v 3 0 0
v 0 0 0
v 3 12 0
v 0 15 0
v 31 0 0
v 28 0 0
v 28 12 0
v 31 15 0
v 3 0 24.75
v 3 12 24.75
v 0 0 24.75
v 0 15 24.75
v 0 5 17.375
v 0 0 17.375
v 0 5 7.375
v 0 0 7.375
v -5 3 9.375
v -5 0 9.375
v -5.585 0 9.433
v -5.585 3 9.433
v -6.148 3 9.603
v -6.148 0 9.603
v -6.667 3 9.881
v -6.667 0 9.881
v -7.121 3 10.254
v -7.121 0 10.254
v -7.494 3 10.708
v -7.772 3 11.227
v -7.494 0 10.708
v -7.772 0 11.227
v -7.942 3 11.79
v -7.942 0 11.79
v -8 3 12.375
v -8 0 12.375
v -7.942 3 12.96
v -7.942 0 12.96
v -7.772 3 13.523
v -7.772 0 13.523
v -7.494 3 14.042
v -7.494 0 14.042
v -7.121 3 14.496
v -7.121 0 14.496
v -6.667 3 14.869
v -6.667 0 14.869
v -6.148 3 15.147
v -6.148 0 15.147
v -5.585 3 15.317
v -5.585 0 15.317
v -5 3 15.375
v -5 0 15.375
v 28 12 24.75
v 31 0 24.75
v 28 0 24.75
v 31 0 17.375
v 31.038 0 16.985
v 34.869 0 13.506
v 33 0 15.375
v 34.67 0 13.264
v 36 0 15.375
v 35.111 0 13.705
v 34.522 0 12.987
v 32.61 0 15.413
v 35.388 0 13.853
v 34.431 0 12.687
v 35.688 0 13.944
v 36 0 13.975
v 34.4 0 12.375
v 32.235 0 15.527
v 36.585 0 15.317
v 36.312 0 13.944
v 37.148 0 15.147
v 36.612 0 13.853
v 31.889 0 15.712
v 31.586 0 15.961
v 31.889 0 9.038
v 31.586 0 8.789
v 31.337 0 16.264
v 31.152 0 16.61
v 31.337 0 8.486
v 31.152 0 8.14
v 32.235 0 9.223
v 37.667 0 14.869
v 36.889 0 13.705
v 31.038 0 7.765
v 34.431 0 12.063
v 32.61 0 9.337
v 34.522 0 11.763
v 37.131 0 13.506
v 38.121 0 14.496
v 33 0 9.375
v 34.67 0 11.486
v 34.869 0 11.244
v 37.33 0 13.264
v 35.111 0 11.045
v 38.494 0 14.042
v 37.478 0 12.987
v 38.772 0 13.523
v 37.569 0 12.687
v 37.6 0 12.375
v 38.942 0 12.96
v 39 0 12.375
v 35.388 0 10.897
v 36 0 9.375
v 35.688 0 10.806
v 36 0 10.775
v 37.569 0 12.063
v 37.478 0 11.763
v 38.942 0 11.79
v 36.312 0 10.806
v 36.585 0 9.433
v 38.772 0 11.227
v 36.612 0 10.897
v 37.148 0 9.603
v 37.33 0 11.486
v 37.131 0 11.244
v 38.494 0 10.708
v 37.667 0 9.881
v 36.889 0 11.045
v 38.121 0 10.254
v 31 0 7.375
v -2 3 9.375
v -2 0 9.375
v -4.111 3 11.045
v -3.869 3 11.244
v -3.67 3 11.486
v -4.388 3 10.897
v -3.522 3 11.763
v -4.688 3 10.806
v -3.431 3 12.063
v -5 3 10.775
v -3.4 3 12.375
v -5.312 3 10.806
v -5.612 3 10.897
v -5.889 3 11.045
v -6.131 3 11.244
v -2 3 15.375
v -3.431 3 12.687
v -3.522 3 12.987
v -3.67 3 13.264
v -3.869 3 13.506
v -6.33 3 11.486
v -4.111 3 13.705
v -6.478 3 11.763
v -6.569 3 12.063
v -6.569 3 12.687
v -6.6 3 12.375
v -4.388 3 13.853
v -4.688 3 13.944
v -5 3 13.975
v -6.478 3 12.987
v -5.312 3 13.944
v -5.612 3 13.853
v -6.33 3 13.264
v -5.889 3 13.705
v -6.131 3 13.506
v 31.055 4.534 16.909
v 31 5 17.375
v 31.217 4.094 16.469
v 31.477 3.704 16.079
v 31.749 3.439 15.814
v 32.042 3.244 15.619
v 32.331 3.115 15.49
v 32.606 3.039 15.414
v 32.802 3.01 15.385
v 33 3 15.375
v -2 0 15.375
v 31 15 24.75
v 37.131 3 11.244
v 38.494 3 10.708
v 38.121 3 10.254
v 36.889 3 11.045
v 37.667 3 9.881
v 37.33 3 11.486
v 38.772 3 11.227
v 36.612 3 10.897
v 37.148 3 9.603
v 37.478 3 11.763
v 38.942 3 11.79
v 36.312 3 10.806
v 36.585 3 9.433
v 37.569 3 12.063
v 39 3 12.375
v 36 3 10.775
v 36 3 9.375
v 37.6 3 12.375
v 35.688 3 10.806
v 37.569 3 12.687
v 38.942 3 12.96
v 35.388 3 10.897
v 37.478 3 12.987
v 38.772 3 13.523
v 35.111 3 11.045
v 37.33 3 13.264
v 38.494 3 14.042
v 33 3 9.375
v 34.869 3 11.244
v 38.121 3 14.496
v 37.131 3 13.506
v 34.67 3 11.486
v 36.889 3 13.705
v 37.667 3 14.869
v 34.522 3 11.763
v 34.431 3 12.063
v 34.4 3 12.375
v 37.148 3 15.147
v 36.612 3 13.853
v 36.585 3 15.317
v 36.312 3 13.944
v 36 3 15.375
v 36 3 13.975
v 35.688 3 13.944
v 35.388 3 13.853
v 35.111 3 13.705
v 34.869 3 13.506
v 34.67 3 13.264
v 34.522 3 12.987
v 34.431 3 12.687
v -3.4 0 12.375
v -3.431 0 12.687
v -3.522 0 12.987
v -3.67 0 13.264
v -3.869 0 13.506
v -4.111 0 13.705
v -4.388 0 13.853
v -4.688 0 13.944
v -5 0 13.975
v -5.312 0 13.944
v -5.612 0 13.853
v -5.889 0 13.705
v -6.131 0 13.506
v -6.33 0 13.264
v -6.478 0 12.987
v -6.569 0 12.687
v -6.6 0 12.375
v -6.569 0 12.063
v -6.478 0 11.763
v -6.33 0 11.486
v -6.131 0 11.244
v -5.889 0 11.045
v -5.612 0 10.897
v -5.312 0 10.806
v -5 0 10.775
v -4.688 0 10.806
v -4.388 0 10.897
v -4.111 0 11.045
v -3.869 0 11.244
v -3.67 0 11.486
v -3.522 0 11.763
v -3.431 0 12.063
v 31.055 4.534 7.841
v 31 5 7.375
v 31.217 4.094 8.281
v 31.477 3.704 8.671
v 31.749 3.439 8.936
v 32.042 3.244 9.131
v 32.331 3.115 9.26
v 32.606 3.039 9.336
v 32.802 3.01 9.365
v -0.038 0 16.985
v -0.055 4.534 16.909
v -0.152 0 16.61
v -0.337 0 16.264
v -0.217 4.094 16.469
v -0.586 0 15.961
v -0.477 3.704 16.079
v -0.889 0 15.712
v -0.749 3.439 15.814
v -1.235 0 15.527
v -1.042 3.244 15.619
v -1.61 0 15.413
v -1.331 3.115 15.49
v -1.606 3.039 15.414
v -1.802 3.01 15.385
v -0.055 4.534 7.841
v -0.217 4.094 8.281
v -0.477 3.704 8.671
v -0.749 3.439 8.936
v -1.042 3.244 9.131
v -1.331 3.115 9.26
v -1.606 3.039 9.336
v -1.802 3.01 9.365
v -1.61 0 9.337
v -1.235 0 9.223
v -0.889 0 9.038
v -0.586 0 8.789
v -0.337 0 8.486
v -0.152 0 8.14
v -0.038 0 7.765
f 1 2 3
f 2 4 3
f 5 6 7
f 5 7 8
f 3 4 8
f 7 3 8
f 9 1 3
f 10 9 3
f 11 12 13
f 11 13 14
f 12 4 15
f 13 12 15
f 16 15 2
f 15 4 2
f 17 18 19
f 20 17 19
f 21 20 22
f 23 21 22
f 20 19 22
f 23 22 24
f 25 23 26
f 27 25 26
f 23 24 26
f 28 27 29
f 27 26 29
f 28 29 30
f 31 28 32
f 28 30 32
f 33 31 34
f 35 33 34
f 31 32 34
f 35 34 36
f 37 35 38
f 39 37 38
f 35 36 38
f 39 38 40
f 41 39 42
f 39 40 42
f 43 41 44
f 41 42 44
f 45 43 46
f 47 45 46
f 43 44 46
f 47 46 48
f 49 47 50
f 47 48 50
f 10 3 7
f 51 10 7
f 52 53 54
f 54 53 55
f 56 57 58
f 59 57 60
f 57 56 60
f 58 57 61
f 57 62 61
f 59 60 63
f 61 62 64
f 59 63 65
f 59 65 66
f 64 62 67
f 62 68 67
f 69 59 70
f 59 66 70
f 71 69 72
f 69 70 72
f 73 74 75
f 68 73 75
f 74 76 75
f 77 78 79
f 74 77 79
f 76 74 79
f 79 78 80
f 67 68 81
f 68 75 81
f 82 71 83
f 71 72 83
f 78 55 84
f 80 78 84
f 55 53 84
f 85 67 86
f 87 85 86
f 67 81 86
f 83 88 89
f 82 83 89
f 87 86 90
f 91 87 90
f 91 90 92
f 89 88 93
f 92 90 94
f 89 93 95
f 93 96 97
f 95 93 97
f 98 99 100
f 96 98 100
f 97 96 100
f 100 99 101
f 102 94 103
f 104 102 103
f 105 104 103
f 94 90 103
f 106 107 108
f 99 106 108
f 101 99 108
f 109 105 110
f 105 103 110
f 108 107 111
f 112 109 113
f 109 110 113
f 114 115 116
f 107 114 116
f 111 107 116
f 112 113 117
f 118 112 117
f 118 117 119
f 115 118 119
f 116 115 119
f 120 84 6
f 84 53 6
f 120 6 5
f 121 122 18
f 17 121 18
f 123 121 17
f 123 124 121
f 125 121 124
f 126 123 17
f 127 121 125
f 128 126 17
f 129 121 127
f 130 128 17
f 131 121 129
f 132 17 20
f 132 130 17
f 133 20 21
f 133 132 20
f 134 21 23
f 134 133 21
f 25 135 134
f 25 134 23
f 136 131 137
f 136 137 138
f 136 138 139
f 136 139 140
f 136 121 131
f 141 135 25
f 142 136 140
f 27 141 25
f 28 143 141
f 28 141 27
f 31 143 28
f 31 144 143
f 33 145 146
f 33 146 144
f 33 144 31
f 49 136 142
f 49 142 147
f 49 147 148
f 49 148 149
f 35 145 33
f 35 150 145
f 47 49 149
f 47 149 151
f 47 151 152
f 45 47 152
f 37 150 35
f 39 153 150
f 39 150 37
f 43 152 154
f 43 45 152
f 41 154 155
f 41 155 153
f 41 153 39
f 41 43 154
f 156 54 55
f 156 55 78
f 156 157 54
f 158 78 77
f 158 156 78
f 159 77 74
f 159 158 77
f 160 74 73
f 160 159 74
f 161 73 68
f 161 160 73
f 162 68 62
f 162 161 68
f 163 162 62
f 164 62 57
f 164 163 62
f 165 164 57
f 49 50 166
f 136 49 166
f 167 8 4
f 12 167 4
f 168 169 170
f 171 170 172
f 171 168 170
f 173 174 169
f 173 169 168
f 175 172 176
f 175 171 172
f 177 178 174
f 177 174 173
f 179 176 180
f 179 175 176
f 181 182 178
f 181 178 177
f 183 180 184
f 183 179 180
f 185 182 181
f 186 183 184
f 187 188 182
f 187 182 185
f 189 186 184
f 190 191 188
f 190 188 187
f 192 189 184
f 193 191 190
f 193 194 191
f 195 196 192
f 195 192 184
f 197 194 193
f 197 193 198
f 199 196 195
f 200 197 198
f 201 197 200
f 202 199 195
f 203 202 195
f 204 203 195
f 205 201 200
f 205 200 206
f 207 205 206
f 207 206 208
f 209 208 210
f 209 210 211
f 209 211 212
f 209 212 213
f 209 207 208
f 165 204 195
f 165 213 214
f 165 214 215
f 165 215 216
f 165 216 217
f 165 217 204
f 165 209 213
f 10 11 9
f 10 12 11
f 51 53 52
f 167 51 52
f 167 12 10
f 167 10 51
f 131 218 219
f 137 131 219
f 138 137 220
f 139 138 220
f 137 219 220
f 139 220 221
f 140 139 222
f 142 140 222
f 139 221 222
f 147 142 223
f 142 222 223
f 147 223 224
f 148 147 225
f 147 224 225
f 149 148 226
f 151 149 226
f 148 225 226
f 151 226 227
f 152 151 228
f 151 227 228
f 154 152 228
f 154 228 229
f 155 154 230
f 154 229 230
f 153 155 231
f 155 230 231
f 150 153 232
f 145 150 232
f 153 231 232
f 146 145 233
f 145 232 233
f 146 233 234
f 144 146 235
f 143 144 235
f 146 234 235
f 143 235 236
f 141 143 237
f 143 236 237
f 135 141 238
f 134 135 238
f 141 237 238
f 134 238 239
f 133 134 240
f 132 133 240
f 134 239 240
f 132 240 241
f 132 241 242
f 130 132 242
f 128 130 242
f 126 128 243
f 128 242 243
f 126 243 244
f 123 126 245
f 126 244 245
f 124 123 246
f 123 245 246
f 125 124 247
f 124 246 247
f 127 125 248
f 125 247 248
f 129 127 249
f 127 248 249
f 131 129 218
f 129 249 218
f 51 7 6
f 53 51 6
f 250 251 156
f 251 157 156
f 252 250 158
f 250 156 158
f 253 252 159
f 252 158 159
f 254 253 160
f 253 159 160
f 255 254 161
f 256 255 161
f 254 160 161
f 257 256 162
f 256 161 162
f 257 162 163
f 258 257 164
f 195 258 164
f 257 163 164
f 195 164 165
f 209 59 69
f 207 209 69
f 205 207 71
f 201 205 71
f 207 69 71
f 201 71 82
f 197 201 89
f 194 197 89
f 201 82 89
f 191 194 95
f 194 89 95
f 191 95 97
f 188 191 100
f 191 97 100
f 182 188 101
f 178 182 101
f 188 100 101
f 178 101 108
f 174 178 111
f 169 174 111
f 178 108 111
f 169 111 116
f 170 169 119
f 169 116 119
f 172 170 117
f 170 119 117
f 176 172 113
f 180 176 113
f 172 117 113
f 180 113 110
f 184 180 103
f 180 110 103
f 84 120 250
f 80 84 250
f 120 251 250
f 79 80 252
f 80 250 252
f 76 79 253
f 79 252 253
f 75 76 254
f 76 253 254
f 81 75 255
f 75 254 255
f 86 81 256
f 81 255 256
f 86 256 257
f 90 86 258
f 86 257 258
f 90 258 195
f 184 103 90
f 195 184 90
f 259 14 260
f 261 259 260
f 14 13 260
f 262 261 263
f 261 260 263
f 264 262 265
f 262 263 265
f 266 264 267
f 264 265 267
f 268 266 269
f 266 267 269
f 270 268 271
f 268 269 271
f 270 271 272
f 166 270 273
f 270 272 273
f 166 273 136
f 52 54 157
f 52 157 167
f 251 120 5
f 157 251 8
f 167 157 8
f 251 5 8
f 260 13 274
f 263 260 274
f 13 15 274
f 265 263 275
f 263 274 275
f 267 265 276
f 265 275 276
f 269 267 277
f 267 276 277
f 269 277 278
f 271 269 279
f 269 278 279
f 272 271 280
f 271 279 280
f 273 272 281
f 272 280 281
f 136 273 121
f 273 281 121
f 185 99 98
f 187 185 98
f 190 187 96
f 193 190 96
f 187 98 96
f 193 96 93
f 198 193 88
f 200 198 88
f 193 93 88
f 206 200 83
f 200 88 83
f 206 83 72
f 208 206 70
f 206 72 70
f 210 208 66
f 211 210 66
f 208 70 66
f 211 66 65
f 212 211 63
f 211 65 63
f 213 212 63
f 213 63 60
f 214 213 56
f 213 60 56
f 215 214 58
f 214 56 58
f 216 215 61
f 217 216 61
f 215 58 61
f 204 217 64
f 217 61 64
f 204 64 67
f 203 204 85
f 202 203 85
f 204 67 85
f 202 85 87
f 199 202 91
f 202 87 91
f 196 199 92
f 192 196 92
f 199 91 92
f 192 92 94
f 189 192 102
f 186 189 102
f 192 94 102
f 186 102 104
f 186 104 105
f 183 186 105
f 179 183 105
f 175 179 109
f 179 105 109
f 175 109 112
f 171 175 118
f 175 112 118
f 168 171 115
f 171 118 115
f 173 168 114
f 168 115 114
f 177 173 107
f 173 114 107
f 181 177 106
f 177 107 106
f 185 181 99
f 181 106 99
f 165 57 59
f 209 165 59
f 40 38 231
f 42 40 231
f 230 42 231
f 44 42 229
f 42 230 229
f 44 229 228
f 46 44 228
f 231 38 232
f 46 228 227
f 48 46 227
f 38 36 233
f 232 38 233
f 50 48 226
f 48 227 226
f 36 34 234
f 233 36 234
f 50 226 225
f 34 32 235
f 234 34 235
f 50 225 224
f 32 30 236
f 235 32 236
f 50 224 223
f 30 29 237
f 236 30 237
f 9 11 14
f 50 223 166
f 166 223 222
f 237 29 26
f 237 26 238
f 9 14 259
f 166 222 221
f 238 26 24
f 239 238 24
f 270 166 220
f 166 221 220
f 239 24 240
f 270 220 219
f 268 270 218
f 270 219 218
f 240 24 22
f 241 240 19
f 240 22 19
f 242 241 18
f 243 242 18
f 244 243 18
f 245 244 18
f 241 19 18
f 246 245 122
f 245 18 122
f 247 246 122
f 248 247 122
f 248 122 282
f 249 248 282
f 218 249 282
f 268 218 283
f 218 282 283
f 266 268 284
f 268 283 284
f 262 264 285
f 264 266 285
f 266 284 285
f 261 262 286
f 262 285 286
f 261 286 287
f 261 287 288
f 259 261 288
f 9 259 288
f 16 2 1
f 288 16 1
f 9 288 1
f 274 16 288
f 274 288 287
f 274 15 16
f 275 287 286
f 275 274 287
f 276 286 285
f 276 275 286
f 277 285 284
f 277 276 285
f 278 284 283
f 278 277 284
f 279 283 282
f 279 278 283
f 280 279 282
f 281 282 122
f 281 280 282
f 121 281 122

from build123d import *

# Parameters (mm, degrees)
EXTRUDE_1_DEPTH = 24.75
SKETCH_2_R      = 1.6
EXTRUDE_2_DEPTH = 3
FILLET_1_R      = 2
FILLET_2_R      = 2


with BuildPart() as part:
    # 草图1 → 凸台-拉伸1 (new body)
    with BuildSketch(Plane.XY):
        Polygon((0, 0), (3, 0), (3, 12), (28, 12), (28, 0), (31, 0), (31, 15), (0, 15), align=None)
    extrude(amount=EXTRUDE_1_DEPTH)

    # 草图2 → 凸台-拉伸2 (add)
    with BuildSketch(Plane.XZ):
        with BuildLine():
            Line((36, 9.375), (31, 9.375))
            Line((31, 9.375), (31, 15.375))
            Line((31, 15.375), (36, 15.375))
            ThreePointArc((36, 15.375), (39, 12.375), (36, 9.375))
        make_face()
        with Locations((36, 12.375)):
            Circle(SKETCH_2_R, mode=Mode.SUBTRACT)
        with BuildLine():
            Line((0, 15.375), (0, 9.375))
            Line((0, 9.375), (-5, 9.375))
            ThreePointArc((-5, 9.375), (-8, 12.375), (-5, 15.375))
            Line((-5, 15.375), (0, 15.375))
        make_face()
        with Locations((-5, 12.375)):
            Circle(SKETCH_2_R, mode=Mode.SUBTRACT)
    extrude(amount=-EXTRUDE_2_DEPTH)

    # 圆角1
    fillet_1_edges = [part.edges().sort_by_distance(p)[0] for p in [
        (31, 3, 12.375),
        (31, 1.5, 9.375),
        (31, 1.5, 15.375),
    ]]
    fillet(fillet_1_edges, radius=FILLET_1_R)

    # 圆角2
    fillet_2_edges = [part.edges().sort_by_distance(p)[0] for p in [
        (0, 3, 12.375),
        (0, 1.5, 15.375),
        (0, 1.5, 9.375),
    ]]
    fillet(fillet_2_edges, radius=FILLET_2_R)


solid = part.part
